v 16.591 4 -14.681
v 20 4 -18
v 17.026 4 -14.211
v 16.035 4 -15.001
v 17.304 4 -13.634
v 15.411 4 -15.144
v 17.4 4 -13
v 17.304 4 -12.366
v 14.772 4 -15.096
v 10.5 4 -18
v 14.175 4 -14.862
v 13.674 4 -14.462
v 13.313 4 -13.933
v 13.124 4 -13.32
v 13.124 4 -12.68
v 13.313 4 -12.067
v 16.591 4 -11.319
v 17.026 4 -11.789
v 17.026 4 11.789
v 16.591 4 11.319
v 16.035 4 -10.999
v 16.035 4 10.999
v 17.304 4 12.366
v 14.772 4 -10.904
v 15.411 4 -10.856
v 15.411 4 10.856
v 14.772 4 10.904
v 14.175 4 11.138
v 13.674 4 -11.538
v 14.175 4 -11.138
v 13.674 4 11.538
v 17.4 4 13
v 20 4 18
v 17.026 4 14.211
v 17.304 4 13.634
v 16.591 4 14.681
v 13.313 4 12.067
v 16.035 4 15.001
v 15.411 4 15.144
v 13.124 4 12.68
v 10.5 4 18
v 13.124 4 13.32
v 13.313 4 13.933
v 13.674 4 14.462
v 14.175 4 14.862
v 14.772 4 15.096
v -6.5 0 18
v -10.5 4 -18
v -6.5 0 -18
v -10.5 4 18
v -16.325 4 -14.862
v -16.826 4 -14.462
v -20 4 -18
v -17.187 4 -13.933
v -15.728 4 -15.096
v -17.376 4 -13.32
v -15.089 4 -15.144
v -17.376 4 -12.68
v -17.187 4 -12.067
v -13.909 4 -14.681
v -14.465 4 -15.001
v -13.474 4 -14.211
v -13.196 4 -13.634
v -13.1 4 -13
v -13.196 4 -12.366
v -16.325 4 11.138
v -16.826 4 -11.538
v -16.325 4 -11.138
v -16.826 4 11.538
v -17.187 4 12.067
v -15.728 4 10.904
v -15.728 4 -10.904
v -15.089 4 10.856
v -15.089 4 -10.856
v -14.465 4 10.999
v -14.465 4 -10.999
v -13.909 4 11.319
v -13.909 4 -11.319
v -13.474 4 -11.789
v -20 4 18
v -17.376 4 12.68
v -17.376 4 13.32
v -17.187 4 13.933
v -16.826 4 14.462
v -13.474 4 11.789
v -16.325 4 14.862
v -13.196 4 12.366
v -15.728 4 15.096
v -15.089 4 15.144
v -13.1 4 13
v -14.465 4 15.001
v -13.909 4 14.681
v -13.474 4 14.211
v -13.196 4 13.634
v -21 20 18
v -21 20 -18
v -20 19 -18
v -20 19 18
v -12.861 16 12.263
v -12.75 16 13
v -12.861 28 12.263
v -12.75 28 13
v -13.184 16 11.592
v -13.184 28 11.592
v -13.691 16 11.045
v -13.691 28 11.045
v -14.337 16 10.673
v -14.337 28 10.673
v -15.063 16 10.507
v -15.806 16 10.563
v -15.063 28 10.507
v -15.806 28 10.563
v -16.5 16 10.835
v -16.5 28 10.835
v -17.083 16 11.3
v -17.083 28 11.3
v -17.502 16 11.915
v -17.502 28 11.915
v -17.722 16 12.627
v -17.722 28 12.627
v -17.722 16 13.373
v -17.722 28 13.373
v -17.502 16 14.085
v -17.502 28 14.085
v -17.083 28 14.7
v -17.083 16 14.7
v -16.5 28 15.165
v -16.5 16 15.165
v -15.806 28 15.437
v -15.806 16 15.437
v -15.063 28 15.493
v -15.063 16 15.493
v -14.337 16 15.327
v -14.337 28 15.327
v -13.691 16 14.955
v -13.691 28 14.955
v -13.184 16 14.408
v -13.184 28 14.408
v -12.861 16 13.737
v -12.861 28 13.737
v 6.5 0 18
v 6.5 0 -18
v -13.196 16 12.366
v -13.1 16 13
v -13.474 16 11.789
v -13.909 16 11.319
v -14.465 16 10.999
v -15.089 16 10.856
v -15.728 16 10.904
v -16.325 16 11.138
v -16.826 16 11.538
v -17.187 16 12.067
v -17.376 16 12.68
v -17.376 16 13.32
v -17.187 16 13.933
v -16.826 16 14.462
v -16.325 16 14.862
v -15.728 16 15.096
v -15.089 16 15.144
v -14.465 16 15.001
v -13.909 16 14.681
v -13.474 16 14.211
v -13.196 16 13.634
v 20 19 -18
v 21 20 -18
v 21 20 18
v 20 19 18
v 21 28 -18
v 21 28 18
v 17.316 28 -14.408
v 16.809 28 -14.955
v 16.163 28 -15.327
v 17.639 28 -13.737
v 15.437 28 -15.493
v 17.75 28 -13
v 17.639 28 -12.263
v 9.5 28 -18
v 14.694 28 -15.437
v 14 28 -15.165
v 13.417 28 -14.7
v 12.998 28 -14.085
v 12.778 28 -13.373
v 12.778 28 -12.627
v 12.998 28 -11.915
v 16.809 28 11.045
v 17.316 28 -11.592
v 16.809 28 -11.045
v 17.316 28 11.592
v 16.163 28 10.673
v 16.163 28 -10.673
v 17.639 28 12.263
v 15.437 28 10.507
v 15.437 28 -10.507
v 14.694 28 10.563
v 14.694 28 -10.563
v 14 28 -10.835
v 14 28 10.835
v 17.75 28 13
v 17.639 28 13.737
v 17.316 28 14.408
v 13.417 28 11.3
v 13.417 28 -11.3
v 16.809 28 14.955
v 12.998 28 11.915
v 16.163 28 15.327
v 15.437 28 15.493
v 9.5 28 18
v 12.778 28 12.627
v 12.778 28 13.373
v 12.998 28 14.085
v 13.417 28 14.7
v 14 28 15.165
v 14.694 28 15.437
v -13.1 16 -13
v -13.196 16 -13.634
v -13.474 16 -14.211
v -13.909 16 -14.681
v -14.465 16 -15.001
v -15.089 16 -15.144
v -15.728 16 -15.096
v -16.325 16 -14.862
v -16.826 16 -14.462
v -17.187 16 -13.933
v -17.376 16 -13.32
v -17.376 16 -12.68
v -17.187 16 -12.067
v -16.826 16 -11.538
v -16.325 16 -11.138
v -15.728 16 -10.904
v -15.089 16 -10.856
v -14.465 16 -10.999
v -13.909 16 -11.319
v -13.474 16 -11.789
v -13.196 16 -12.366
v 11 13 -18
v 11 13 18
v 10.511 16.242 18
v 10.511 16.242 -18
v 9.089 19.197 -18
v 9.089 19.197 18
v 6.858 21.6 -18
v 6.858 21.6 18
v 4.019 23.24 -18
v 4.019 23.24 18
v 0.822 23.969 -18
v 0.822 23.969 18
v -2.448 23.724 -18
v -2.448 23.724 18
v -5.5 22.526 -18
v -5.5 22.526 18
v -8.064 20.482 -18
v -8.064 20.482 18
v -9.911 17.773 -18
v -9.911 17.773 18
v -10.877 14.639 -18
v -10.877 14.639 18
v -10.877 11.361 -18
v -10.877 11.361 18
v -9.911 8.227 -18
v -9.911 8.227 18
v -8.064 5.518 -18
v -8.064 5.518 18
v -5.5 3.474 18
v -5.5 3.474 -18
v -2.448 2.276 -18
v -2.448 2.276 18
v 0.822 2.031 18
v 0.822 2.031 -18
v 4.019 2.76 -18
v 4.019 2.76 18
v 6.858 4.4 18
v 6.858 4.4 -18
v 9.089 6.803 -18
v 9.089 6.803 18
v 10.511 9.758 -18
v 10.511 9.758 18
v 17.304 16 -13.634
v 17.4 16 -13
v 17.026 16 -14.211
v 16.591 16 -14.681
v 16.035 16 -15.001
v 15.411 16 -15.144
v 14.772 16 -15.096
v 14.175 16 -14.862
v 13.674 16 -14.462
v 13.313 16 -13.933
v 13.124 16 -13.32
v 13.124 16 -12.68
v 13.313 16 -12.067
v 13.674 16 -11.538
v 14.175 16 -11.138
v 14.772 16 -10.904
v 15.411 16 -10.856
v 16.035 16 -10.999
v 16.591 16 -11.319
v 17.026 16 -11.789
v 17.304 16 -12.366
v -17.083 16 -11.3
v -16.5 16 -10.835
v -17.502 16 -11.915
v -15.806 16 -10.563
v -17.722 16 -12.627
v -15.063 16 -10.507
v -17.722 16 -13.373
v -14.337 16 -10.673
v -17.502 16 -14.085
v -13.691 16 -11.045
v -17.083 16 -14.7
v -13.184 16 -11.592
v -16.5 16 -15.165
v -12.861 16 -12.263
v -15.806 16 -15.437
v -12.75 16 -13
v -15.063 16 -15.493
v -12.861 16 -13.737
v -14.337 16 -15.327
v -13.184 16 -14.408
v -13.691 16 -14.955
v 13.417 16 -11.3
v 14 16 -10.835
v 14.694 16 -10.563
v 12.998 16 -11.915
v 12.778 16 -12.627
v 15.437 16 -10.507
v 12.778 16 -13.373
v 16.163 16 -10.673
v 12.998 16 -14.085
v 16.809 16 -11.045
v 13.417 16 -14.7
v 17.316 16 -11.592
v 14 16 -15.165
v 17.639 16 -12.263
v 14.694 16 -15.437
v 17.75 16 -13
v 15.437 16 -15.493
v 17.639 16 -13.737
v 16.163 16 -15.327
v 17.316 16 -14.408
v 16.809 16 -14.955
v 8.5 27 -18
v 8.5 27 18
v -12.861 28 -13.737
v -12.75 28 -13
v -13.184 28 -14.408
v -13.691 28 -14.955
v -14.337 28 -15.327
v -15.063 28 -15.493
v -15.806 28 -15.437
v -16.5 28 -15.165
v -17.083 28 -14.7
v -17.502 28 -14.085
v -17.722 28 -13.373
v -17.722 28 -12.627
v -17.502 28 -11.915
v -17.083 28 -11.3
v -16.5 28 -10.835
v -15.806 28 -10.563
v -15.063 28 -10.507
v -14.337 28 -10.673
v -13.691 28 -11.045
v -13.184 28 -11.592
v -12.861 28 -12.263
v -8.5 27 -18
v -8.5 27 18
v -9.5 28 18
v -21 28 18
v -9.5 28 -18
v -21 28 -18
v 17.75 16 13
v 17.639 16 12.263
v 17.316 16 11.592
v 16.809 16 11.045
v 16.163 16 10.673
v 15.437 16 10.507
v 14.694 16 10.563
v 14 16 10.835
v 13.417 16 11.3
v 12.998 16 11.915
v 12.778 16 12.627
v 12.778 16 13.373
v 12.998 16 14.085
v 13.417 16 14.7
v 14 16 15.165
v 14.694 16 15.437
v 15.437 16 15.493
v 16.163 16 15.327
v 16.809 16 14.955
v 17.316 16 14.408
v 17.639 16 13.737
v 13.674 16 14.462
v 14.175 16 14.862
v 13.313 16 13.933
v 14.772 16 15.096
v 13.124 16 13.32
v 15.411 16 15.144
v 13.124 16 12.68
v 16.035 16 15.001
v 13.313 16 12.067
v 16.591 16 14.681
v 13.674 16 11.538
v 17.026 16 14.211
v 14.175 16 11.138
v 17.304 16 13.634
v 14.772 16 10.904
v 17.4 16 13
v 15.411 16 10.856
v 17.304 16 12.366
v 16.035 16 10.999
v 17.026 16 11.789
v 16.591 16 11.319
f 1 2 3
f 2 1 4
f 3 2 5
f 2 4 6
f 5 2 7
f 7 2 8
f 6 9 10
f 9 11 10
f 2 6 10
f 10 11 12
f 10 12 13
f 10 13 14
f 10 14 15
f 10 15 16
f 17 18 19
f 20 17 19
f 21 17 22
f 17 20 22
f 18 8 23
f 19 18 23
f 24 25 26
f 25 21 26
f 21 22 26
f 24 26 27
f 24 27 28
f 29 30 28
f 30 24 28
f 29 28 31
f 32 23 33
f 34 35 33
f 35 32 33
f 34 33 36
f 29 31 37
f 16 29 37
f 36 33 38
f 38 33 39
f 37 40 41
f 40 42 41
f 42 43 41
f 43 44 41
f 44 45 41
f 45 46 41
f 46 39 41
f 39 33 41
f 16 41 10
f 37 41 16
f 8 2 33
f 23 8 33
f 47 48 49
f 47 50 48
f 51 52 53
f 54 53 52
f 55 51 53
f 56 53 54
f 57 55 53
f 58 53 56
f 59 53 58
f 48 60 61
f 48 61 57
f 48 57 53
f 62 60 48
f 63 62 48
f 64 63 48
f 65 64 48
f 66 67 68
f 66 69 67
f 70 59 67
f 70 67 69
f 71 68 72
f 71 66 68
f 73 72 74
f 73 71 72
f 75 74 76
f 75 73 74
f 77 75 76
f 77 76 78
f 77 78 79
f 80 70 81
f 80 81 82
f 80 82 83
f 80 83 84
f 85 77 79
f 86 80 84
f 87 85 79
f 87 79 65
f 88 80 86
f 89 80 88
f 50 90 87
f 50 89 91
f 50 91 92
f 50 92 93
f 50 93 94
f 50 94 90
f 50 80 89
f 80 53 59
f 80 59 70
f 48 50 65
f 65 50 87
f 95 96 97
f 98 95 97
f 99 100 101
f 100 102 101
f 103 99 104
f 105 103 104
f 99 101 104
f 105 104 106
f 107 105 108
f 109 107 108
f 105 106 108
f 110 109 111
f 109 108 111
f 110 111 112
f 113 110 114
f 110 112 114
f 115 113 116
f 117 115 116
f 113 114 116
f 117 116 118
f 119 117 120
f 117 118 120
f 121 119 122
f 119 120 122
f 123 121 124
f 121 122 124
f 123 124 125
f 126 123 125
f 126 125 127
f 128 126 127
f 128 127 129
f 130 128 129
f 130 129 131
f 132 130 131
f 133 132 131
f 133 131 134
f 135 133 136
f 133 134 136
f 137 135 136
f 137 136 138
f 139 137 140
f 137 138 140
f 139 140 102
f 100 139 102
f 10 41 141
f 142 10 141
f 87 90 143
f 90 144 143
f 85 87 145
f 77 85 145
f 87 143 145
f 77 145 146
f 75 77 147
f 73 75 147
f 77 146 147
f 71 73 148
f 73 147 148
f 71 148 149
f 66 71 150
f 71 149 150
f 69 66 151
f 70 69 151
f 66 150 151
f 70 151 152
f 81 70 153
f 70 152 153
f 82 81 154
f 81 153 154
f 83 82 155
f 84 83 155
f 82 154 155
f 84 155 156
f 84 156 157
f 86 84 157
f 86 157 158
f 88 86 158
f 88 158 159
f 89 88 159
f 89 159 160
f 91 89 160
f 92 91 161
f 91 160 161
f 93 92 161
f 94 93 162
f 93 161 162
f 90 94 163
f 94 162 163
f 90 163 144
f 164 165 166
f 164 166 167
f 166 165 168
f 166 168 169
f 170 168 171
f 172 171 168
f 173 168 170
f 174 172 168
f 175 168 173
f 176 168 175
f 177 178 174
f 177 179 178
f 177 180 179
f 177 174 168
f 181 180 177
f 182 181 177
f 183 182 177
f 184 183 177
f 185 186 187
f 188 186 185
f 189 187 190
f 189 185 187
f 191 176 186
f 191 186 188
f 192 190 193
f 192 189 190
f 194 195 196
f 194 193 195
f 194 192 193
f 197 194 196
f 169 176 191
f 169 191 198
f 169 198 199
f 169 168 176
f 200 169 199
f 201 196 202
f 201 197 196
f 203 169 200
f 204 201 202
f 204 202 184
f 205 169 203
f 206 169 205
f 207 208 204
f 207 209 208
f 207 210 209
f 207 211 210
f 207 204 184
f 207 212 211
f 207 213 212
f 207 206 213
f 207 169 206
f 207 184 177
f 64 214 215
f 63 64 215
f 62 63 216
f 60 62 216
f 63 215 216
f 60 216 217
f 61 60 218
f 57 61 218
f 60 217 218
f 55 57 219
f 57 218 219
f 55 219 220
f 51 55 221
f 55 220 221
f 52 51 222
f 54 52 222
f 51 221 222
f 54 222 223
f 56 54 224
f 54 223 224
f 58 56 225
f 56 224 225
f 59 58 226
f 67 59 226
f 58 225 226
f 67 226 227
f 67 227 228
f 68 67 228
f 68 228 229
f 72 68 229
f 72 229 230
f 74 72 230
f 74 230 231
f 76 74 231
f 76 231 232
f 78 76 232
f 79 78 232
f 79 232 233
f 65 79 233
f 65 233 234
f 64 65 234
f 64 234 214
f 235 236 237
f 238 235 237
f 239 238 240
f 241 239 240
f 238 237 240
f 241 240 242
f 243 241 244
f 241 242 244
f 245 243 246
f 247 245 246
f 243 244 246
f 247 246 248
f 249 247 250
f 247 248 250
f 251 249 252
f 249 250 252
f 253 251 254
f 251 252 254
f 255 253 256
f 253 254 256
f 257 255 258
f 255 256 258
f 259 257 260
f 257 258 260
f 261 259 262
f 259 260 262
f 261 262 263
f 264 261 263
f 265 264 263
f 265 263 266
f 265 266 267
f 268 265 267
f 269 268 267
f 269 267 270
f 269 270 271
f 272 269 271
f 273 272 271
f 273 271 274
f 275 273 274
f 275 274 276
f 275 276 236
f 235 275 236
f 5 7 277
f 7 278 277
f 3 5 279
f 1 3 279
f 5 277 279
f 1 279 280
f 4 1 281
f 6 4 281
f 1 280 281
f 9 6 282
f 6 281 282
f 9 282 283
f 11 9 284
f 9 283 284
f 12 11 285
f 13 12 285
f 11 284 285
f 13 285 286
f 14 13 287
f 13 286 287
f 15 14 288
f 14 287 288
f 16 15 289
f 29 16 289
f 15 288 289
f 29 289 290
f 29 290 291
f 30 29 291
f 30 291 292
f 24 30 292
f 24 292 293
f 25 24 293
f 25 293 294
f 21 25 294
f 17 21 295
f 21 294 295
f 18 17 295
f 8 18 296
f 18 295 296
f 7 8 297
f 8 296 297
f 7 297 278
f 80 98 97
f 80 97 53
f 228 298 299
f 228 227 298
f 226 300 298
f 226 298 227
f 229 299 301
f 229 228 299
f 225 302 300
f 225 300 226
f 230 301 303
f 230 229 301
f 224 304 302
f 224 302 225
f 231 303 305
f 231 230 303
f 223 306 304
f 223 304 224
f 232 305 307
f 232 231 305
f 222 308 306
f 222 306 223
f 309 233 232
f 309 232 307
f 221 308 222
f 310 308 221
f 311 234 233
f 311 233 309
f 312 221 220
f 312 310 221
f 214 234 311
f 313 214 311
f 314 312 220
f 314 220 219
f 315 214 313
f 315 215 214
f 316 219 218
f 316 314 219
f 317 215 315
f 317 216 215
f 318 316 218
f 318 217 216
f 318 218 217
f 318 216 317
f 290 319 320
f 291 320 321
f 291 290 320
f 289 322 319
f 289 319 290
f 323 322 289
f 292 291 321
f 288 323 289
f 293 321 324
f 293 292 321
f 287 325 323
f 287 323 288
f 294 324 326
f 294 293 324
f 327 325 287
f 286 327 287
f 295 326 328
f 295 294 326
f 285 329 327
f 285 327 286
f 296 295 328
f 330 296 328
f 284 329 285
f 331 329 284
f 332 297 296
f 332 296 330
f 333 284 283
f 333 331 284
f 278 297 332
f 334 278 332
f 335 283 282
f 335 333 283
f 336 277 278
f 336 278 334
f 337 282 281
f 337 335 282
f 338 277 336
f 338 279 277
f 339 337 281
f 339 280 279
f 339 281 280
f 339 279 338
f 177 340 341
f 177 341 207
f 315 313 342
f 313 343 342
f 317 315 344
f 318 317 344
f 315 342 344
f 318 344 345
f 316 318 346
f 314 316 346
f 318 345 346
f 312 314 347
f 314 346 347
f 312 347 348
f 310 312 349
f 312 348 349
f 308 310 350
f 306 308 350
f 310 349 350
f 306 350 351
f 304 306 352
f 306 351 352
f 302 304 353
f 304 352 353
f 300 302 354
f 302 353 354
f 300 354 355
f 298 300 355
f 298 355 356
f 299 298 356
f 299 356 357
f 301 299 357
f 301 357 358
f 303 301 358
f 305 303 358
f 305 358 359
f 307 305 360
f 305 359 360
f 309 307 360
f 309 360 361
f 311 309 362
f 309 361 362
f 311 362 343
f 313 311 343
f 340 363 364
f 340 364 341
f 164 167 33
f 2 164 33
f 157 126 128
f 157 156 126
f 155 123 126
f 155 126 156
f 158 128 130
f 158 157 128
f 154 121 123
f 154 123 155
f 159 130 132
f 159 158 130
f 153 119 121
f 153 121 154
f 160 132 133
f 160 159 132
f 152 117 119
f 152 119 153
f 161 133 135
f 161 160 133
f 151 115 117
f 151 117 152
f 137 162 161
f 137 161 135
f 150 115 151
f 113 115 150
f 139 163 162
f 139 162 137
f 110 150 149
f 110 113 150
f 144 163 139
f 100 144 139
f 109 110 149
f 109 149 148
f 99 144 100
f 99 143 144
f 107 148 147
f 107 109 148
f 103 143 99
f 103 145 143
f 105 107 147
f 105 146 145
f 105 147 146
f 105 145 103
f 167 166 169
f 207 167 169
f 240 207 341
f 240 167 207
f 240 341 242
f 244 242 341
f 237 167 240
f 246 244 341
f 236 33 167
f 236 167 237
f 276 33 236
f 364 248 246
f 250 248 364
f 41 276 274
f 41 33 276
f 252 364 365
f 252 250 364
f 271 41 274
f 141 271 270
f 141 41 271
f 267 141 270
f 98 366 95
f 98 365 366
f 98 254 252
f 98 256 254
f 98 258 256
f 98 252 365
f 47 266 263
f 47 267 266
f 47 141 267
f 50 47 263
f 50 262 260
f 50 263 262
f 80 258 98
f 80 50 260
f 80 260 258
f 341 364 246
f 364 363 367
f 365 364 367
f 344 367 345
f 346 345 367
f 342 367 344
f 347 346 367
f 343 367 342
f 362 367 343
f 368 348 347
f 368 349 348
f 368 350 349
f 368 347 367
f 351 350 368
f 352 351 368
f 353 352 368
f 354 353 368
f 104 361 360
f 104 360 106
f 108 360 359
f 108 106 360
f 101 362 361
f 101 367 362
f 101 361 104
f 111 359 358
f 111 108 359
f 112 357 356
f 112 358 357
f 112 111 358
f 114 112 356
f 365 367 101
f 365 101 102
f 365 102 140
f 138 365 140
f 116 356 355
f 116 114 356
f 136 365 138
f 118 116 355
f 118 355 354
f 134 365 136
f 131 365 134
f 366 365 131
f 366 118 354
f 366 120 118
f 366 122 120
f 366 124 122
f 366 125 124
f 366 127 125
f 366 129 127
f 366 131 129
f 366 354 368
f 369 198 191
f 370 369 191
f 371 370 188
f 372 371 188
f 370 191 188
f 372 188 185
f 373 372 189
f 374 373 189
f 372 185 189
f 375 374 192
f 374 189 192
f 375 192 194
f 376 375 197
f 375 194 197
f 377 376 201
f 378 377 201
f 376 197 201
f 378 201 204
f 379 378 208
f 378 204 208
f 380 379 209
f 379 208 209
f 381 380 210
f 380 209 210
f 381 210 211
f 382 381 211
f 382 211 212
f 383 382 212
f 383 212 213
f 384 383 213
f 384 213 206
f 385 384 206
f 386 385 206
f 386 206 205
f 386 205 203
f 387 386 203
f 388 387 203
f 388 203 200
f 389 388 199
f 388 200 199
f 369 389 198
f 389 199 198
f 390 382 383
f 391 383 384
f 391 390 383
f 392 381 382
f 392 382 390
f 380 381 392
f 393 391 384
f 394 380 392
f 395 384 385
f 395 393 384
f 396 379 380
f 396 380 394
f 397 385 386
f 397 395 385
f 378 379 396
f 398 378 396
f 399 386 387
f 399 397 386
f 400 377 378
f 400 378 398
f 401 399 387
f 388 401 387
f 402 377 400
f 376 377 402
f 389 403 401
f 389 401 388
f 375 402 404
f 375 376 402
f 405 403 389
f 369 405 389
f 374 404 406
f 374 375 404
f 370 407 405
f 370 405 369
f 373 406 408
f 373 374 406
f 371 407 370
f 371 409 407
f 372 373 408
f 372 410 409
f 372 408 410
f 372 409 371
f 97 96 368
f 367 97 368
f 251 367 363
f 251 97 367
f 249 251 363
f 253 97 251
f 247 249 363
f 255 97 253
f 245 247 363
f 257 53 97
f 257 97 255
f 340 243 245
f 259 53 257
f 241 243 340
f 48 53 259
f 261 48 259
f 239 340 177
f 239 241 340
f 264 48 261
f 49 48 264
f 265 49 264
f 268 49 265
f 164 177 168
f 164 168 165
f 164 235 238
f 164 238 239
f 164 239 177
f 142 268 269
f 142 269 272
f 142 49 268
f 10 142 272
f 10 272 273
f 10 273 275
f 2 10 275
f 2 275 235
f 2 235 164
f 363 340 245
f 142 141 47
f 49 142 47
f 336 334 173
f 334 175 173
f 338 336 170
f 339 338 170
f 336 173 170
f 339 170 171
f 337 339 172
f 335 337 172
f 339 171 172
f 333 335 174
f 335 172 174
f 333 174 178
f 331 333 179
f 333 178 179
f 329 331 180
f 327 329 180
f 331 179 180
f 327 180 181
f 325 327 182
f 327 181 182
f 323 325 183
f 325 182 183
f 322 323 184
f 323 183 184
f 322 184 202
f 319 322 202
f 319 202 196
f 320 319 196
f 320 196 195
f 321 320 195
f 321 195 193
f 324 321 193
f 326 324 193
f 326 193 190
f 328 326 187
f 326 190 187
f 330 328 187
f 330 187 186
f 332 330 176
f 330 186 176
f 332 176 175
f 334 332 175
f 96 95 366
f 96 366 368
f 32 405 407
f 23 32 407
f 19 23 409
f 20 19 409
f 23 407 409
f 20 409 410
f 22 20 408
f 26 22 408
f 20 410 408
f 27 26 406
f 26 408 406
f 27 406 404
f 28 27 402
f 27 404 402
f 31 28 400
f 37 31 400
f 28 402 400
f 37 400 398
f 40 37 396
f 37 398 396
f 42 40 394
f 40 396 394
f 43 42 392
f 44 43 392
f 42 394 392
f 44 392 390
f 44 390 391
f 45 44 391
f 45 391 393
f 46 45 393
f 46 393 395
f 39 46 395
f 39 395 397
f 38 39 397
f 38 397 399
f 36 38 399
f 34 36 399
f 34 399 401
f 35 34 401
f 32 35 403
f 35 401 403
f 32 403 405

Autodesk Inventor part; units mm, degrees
ref_plane "YZ Plane" through (0, 0, 0) normal (1, 0, 0) x (0, 1, 0)
ref_plane "XZ Plane" through (0, 0, 0) normal (0, 1, 0) x (-1, 0, 0)
ref_plane "XY Plane" through (0, 0, 0) normal (0, 0, 1) x (1, 0, 0)
sketch "Sketch1" plane through (0, 0, 0) normal (0, 1, 0) x (-1, 0, 0)
  line L0 (21, -18) -> (-21, -18)
  line L1 (-21, -18) -> (-21, 18)
  line L2 (-21, 18) -> (21, 18)
  line L3 (21, 18) -> (21, -18)
  line L4 (0, -18) -> (0, 18) construction
  line L5 (21, 0) -> (-21, 0) construction
  point P0 (0, 0)
  point P1 (0, 0)
  dimension "d0" = 42
  dimension "d1" = 36
extrude "Extrusion1" add sketch "Sketch1" along normal blind 28
sketch "Sketch2" plane through (-21, 0, 18) normal (0, 0, 1) x (1, 0, 0)
  line L0 (42, 28) -> (0, 28) projected
  line L1 (21, 28) -> (21, 0) construction
  line L2 (0, 0) -> (0, 28) projected
  line L3 (0, 13) -> (42, 13) construction
  circle A0 centre (21, 13) radius 11
  dimension "d4" = 15
  dimension "d5" = 22
extrude "Extrusion2" cut sketch "Sketch2" against normal up to next
sketch "Sketch3" plane through (0, 28, 0) normal (0, 1, 0) x (1, 0, 0)
  line L0 (-15.25, 13) -> (15.25, 13) construction
  line L1 (15.25, 13) -> (15.25, -13) construction
  line L2 (15.25, -13) -> (-15.25, -13) construction
  line L3 (-15.25, -13) -> (-15.25, 13) construction
  line L4 (0, 13) -> (0, -13) construction
  line L5 (-15.25, 0) -> (15.25, 0) construction
  circle A0 centre (-15.25, 13) radius 2.15
  circle A1 centre (-15.25, -13) radius 2.15
  circle A2 centre (15.25, 13) radius 2.15
  circle A3 centre (15.25, -13) radius 2.15
  point P0 (0, 0)
  point P1 (0, 0)
  dimension "d8" = 26
  dimension "d9" = 30.5
  dimension "d10" = 4.3
  dimension "d11" = 4.3
  dimension "d12" = 4.3
  dimension "d13" = 4.3
extrude "Extrusion3" cut sketch "Sketch3" against normal up to next
sketch "Sketch4" plane through (0, 28, 0) normal (0, 1, 0) x (1, 0, 0)
  circle A0 centre (15.25, -13) radius 2.15 projected
  circle A1 centre (15.25, -13) radius 2.5
  circle A2 centre (-15.25, -13) radius 2.15 projected
  circle A3 centre (-15.25, -13) radius 2.5
  circle A4 centre (15.25, 13) radius 2.15 projected
  circle A5 centre (15.25, 13) radius 2.5
  circle A6 centre (-15.25, 13) radius 2.15 projected
  circle A7 centre (-15.25, 13) radius 2.5
  point P0 (0, 0)
  dimension "d16" = 5
  dimension "d17" = 5
  dimension "d18" = 5
  dimension "d19" = 5
extrude "Extrusion5" cut sketch "Sketch4" against normal blind 12 contours A1 | A3 | A4 | A5 | A7
sketch "Sketch5" plane through (-21, 0, 18) normal (0, 0, 1) x (1, 0, 0)
  line L0 (0, 28) -> (42, 28) construction
  line L1 (21, 28) -> (21, 0) construction
  line L2 (42, 0) -> (0, 0) construction
  line L3 (0, 28) -> (0, 20)
  line L4 (0, 0) -> (0, 28) projected
  line L5 (21, 0) -> (14.5, 0)
  line L6 (10.5, 4) -> (14.5, 0)
  line L7 (0, 20) -> (1, 19)
  line L8 (1, 19) -> (1, 4)
  line L9 (1, 4) -> (10.5, 4)
  line L10 (0, 20) -> (0, 0)
  line L11 (14.5, 0) -> (0, 0)
  line L12 (0, 0) -> (42, 0) construction
  line L13 (42, 0) -> (42, 28)
  line L14 (31.5, 4) -> (27.5, 0)
  line L15 (42, 20) -> (41, 19)
  line L16 (41, 19) -> (41, 4)
  line L17 (41, 4) -> (31.5, 4)
  line L18 (27.5, 0) -> (42, 0)
  dimension "d27" = 8
  dimension "d28" = 9
  dimension "d29" = 135
  dimension "d35" = 9.5
  dimension "d43" = 135
  dimension "d44" = 24
extrude "Extrusion7" cut sketch "Sketch5" against normal up to next
sketch "Sketch6" plane through (0, 28, 0) normal (0, 1, 0) x (1, 0, 0)
  line L0 (6.5, -18) -> (10.5, -18) projected
  circle A0 centre (15.25, -13) radius 2.5 construction
  line L1 (15.25, -13) -> (15.25, -18) construction
  line L2 (-21, -18) -> (21, -18) construction
  line L3 (21, 18) -> (-21, 18) projected
  line L4 (9.5, 18) -> (-9.5, 18)
  line L5 (-9.5, 18) -> (-9.5, -18)
  line L6 (-9.5, -18) -> (9.5, -18)
  line L7 (9.5, -18) -> (9.5, 18)
  line L8 (0, -18) -> (0, 18) construction
  line L9 (0, 18) -> (0, -18) construction
  point P0 (0, 0)
  dimension "d36" = 5.75
extrude "Extrusion8" cut sketch "Sketch6" against normal blind 1
sketch "Sketch7" plane through (6.5, 0, -18) normal (0, 0, -1) x (-1, 0, 0)
  line L0 (16, 27) -> (-3, 27) projected
  line L1 (-3, 28) -> (-14.5, 28) projected
  line L2 (-3, 27) -> (-3, 28)
  line L3 (-3, 27) -> (-2, 27)
  line L4 (-2, 27) -> (-3, 28)
  line L5 (-3, 27) -> (-3, 28) construction
  line L6 (27.5, 28) -> (16, 28) construction
  line L7 (-3, 28) -> (16, 28) construction
  line L8 (6.5, 28) -> (6.5, 27) construction
  line L9 (-3, 27) -> (16, 27)
  line L10 (16, 27) -> (16, 28)
  line L11 (15, 27) -> (16, 28)
  line L12 (15, 27) -> (16, 27) construction
  point P0 (6.5, 0)
  dimension "d39" = 1
extrude "Extrusion9" add sketch "Sketch7" against normal blind 36
thread "Thread1" size "M5x0.8" class "6H" standard "ANSI Metric M Profile" full length
thread "Thread2" size "M5x0.8" class "6H" standard "ANSI Metric M Profile" full length
thread "Thread3" size "M5x0.8" class "6H" standard "ANSI Metric M Profile" full length
thread "Thread4" size "M5x0.8" class "6H" standard "ANSI Metric M Profile" full length
properties part number "SC12UU"
